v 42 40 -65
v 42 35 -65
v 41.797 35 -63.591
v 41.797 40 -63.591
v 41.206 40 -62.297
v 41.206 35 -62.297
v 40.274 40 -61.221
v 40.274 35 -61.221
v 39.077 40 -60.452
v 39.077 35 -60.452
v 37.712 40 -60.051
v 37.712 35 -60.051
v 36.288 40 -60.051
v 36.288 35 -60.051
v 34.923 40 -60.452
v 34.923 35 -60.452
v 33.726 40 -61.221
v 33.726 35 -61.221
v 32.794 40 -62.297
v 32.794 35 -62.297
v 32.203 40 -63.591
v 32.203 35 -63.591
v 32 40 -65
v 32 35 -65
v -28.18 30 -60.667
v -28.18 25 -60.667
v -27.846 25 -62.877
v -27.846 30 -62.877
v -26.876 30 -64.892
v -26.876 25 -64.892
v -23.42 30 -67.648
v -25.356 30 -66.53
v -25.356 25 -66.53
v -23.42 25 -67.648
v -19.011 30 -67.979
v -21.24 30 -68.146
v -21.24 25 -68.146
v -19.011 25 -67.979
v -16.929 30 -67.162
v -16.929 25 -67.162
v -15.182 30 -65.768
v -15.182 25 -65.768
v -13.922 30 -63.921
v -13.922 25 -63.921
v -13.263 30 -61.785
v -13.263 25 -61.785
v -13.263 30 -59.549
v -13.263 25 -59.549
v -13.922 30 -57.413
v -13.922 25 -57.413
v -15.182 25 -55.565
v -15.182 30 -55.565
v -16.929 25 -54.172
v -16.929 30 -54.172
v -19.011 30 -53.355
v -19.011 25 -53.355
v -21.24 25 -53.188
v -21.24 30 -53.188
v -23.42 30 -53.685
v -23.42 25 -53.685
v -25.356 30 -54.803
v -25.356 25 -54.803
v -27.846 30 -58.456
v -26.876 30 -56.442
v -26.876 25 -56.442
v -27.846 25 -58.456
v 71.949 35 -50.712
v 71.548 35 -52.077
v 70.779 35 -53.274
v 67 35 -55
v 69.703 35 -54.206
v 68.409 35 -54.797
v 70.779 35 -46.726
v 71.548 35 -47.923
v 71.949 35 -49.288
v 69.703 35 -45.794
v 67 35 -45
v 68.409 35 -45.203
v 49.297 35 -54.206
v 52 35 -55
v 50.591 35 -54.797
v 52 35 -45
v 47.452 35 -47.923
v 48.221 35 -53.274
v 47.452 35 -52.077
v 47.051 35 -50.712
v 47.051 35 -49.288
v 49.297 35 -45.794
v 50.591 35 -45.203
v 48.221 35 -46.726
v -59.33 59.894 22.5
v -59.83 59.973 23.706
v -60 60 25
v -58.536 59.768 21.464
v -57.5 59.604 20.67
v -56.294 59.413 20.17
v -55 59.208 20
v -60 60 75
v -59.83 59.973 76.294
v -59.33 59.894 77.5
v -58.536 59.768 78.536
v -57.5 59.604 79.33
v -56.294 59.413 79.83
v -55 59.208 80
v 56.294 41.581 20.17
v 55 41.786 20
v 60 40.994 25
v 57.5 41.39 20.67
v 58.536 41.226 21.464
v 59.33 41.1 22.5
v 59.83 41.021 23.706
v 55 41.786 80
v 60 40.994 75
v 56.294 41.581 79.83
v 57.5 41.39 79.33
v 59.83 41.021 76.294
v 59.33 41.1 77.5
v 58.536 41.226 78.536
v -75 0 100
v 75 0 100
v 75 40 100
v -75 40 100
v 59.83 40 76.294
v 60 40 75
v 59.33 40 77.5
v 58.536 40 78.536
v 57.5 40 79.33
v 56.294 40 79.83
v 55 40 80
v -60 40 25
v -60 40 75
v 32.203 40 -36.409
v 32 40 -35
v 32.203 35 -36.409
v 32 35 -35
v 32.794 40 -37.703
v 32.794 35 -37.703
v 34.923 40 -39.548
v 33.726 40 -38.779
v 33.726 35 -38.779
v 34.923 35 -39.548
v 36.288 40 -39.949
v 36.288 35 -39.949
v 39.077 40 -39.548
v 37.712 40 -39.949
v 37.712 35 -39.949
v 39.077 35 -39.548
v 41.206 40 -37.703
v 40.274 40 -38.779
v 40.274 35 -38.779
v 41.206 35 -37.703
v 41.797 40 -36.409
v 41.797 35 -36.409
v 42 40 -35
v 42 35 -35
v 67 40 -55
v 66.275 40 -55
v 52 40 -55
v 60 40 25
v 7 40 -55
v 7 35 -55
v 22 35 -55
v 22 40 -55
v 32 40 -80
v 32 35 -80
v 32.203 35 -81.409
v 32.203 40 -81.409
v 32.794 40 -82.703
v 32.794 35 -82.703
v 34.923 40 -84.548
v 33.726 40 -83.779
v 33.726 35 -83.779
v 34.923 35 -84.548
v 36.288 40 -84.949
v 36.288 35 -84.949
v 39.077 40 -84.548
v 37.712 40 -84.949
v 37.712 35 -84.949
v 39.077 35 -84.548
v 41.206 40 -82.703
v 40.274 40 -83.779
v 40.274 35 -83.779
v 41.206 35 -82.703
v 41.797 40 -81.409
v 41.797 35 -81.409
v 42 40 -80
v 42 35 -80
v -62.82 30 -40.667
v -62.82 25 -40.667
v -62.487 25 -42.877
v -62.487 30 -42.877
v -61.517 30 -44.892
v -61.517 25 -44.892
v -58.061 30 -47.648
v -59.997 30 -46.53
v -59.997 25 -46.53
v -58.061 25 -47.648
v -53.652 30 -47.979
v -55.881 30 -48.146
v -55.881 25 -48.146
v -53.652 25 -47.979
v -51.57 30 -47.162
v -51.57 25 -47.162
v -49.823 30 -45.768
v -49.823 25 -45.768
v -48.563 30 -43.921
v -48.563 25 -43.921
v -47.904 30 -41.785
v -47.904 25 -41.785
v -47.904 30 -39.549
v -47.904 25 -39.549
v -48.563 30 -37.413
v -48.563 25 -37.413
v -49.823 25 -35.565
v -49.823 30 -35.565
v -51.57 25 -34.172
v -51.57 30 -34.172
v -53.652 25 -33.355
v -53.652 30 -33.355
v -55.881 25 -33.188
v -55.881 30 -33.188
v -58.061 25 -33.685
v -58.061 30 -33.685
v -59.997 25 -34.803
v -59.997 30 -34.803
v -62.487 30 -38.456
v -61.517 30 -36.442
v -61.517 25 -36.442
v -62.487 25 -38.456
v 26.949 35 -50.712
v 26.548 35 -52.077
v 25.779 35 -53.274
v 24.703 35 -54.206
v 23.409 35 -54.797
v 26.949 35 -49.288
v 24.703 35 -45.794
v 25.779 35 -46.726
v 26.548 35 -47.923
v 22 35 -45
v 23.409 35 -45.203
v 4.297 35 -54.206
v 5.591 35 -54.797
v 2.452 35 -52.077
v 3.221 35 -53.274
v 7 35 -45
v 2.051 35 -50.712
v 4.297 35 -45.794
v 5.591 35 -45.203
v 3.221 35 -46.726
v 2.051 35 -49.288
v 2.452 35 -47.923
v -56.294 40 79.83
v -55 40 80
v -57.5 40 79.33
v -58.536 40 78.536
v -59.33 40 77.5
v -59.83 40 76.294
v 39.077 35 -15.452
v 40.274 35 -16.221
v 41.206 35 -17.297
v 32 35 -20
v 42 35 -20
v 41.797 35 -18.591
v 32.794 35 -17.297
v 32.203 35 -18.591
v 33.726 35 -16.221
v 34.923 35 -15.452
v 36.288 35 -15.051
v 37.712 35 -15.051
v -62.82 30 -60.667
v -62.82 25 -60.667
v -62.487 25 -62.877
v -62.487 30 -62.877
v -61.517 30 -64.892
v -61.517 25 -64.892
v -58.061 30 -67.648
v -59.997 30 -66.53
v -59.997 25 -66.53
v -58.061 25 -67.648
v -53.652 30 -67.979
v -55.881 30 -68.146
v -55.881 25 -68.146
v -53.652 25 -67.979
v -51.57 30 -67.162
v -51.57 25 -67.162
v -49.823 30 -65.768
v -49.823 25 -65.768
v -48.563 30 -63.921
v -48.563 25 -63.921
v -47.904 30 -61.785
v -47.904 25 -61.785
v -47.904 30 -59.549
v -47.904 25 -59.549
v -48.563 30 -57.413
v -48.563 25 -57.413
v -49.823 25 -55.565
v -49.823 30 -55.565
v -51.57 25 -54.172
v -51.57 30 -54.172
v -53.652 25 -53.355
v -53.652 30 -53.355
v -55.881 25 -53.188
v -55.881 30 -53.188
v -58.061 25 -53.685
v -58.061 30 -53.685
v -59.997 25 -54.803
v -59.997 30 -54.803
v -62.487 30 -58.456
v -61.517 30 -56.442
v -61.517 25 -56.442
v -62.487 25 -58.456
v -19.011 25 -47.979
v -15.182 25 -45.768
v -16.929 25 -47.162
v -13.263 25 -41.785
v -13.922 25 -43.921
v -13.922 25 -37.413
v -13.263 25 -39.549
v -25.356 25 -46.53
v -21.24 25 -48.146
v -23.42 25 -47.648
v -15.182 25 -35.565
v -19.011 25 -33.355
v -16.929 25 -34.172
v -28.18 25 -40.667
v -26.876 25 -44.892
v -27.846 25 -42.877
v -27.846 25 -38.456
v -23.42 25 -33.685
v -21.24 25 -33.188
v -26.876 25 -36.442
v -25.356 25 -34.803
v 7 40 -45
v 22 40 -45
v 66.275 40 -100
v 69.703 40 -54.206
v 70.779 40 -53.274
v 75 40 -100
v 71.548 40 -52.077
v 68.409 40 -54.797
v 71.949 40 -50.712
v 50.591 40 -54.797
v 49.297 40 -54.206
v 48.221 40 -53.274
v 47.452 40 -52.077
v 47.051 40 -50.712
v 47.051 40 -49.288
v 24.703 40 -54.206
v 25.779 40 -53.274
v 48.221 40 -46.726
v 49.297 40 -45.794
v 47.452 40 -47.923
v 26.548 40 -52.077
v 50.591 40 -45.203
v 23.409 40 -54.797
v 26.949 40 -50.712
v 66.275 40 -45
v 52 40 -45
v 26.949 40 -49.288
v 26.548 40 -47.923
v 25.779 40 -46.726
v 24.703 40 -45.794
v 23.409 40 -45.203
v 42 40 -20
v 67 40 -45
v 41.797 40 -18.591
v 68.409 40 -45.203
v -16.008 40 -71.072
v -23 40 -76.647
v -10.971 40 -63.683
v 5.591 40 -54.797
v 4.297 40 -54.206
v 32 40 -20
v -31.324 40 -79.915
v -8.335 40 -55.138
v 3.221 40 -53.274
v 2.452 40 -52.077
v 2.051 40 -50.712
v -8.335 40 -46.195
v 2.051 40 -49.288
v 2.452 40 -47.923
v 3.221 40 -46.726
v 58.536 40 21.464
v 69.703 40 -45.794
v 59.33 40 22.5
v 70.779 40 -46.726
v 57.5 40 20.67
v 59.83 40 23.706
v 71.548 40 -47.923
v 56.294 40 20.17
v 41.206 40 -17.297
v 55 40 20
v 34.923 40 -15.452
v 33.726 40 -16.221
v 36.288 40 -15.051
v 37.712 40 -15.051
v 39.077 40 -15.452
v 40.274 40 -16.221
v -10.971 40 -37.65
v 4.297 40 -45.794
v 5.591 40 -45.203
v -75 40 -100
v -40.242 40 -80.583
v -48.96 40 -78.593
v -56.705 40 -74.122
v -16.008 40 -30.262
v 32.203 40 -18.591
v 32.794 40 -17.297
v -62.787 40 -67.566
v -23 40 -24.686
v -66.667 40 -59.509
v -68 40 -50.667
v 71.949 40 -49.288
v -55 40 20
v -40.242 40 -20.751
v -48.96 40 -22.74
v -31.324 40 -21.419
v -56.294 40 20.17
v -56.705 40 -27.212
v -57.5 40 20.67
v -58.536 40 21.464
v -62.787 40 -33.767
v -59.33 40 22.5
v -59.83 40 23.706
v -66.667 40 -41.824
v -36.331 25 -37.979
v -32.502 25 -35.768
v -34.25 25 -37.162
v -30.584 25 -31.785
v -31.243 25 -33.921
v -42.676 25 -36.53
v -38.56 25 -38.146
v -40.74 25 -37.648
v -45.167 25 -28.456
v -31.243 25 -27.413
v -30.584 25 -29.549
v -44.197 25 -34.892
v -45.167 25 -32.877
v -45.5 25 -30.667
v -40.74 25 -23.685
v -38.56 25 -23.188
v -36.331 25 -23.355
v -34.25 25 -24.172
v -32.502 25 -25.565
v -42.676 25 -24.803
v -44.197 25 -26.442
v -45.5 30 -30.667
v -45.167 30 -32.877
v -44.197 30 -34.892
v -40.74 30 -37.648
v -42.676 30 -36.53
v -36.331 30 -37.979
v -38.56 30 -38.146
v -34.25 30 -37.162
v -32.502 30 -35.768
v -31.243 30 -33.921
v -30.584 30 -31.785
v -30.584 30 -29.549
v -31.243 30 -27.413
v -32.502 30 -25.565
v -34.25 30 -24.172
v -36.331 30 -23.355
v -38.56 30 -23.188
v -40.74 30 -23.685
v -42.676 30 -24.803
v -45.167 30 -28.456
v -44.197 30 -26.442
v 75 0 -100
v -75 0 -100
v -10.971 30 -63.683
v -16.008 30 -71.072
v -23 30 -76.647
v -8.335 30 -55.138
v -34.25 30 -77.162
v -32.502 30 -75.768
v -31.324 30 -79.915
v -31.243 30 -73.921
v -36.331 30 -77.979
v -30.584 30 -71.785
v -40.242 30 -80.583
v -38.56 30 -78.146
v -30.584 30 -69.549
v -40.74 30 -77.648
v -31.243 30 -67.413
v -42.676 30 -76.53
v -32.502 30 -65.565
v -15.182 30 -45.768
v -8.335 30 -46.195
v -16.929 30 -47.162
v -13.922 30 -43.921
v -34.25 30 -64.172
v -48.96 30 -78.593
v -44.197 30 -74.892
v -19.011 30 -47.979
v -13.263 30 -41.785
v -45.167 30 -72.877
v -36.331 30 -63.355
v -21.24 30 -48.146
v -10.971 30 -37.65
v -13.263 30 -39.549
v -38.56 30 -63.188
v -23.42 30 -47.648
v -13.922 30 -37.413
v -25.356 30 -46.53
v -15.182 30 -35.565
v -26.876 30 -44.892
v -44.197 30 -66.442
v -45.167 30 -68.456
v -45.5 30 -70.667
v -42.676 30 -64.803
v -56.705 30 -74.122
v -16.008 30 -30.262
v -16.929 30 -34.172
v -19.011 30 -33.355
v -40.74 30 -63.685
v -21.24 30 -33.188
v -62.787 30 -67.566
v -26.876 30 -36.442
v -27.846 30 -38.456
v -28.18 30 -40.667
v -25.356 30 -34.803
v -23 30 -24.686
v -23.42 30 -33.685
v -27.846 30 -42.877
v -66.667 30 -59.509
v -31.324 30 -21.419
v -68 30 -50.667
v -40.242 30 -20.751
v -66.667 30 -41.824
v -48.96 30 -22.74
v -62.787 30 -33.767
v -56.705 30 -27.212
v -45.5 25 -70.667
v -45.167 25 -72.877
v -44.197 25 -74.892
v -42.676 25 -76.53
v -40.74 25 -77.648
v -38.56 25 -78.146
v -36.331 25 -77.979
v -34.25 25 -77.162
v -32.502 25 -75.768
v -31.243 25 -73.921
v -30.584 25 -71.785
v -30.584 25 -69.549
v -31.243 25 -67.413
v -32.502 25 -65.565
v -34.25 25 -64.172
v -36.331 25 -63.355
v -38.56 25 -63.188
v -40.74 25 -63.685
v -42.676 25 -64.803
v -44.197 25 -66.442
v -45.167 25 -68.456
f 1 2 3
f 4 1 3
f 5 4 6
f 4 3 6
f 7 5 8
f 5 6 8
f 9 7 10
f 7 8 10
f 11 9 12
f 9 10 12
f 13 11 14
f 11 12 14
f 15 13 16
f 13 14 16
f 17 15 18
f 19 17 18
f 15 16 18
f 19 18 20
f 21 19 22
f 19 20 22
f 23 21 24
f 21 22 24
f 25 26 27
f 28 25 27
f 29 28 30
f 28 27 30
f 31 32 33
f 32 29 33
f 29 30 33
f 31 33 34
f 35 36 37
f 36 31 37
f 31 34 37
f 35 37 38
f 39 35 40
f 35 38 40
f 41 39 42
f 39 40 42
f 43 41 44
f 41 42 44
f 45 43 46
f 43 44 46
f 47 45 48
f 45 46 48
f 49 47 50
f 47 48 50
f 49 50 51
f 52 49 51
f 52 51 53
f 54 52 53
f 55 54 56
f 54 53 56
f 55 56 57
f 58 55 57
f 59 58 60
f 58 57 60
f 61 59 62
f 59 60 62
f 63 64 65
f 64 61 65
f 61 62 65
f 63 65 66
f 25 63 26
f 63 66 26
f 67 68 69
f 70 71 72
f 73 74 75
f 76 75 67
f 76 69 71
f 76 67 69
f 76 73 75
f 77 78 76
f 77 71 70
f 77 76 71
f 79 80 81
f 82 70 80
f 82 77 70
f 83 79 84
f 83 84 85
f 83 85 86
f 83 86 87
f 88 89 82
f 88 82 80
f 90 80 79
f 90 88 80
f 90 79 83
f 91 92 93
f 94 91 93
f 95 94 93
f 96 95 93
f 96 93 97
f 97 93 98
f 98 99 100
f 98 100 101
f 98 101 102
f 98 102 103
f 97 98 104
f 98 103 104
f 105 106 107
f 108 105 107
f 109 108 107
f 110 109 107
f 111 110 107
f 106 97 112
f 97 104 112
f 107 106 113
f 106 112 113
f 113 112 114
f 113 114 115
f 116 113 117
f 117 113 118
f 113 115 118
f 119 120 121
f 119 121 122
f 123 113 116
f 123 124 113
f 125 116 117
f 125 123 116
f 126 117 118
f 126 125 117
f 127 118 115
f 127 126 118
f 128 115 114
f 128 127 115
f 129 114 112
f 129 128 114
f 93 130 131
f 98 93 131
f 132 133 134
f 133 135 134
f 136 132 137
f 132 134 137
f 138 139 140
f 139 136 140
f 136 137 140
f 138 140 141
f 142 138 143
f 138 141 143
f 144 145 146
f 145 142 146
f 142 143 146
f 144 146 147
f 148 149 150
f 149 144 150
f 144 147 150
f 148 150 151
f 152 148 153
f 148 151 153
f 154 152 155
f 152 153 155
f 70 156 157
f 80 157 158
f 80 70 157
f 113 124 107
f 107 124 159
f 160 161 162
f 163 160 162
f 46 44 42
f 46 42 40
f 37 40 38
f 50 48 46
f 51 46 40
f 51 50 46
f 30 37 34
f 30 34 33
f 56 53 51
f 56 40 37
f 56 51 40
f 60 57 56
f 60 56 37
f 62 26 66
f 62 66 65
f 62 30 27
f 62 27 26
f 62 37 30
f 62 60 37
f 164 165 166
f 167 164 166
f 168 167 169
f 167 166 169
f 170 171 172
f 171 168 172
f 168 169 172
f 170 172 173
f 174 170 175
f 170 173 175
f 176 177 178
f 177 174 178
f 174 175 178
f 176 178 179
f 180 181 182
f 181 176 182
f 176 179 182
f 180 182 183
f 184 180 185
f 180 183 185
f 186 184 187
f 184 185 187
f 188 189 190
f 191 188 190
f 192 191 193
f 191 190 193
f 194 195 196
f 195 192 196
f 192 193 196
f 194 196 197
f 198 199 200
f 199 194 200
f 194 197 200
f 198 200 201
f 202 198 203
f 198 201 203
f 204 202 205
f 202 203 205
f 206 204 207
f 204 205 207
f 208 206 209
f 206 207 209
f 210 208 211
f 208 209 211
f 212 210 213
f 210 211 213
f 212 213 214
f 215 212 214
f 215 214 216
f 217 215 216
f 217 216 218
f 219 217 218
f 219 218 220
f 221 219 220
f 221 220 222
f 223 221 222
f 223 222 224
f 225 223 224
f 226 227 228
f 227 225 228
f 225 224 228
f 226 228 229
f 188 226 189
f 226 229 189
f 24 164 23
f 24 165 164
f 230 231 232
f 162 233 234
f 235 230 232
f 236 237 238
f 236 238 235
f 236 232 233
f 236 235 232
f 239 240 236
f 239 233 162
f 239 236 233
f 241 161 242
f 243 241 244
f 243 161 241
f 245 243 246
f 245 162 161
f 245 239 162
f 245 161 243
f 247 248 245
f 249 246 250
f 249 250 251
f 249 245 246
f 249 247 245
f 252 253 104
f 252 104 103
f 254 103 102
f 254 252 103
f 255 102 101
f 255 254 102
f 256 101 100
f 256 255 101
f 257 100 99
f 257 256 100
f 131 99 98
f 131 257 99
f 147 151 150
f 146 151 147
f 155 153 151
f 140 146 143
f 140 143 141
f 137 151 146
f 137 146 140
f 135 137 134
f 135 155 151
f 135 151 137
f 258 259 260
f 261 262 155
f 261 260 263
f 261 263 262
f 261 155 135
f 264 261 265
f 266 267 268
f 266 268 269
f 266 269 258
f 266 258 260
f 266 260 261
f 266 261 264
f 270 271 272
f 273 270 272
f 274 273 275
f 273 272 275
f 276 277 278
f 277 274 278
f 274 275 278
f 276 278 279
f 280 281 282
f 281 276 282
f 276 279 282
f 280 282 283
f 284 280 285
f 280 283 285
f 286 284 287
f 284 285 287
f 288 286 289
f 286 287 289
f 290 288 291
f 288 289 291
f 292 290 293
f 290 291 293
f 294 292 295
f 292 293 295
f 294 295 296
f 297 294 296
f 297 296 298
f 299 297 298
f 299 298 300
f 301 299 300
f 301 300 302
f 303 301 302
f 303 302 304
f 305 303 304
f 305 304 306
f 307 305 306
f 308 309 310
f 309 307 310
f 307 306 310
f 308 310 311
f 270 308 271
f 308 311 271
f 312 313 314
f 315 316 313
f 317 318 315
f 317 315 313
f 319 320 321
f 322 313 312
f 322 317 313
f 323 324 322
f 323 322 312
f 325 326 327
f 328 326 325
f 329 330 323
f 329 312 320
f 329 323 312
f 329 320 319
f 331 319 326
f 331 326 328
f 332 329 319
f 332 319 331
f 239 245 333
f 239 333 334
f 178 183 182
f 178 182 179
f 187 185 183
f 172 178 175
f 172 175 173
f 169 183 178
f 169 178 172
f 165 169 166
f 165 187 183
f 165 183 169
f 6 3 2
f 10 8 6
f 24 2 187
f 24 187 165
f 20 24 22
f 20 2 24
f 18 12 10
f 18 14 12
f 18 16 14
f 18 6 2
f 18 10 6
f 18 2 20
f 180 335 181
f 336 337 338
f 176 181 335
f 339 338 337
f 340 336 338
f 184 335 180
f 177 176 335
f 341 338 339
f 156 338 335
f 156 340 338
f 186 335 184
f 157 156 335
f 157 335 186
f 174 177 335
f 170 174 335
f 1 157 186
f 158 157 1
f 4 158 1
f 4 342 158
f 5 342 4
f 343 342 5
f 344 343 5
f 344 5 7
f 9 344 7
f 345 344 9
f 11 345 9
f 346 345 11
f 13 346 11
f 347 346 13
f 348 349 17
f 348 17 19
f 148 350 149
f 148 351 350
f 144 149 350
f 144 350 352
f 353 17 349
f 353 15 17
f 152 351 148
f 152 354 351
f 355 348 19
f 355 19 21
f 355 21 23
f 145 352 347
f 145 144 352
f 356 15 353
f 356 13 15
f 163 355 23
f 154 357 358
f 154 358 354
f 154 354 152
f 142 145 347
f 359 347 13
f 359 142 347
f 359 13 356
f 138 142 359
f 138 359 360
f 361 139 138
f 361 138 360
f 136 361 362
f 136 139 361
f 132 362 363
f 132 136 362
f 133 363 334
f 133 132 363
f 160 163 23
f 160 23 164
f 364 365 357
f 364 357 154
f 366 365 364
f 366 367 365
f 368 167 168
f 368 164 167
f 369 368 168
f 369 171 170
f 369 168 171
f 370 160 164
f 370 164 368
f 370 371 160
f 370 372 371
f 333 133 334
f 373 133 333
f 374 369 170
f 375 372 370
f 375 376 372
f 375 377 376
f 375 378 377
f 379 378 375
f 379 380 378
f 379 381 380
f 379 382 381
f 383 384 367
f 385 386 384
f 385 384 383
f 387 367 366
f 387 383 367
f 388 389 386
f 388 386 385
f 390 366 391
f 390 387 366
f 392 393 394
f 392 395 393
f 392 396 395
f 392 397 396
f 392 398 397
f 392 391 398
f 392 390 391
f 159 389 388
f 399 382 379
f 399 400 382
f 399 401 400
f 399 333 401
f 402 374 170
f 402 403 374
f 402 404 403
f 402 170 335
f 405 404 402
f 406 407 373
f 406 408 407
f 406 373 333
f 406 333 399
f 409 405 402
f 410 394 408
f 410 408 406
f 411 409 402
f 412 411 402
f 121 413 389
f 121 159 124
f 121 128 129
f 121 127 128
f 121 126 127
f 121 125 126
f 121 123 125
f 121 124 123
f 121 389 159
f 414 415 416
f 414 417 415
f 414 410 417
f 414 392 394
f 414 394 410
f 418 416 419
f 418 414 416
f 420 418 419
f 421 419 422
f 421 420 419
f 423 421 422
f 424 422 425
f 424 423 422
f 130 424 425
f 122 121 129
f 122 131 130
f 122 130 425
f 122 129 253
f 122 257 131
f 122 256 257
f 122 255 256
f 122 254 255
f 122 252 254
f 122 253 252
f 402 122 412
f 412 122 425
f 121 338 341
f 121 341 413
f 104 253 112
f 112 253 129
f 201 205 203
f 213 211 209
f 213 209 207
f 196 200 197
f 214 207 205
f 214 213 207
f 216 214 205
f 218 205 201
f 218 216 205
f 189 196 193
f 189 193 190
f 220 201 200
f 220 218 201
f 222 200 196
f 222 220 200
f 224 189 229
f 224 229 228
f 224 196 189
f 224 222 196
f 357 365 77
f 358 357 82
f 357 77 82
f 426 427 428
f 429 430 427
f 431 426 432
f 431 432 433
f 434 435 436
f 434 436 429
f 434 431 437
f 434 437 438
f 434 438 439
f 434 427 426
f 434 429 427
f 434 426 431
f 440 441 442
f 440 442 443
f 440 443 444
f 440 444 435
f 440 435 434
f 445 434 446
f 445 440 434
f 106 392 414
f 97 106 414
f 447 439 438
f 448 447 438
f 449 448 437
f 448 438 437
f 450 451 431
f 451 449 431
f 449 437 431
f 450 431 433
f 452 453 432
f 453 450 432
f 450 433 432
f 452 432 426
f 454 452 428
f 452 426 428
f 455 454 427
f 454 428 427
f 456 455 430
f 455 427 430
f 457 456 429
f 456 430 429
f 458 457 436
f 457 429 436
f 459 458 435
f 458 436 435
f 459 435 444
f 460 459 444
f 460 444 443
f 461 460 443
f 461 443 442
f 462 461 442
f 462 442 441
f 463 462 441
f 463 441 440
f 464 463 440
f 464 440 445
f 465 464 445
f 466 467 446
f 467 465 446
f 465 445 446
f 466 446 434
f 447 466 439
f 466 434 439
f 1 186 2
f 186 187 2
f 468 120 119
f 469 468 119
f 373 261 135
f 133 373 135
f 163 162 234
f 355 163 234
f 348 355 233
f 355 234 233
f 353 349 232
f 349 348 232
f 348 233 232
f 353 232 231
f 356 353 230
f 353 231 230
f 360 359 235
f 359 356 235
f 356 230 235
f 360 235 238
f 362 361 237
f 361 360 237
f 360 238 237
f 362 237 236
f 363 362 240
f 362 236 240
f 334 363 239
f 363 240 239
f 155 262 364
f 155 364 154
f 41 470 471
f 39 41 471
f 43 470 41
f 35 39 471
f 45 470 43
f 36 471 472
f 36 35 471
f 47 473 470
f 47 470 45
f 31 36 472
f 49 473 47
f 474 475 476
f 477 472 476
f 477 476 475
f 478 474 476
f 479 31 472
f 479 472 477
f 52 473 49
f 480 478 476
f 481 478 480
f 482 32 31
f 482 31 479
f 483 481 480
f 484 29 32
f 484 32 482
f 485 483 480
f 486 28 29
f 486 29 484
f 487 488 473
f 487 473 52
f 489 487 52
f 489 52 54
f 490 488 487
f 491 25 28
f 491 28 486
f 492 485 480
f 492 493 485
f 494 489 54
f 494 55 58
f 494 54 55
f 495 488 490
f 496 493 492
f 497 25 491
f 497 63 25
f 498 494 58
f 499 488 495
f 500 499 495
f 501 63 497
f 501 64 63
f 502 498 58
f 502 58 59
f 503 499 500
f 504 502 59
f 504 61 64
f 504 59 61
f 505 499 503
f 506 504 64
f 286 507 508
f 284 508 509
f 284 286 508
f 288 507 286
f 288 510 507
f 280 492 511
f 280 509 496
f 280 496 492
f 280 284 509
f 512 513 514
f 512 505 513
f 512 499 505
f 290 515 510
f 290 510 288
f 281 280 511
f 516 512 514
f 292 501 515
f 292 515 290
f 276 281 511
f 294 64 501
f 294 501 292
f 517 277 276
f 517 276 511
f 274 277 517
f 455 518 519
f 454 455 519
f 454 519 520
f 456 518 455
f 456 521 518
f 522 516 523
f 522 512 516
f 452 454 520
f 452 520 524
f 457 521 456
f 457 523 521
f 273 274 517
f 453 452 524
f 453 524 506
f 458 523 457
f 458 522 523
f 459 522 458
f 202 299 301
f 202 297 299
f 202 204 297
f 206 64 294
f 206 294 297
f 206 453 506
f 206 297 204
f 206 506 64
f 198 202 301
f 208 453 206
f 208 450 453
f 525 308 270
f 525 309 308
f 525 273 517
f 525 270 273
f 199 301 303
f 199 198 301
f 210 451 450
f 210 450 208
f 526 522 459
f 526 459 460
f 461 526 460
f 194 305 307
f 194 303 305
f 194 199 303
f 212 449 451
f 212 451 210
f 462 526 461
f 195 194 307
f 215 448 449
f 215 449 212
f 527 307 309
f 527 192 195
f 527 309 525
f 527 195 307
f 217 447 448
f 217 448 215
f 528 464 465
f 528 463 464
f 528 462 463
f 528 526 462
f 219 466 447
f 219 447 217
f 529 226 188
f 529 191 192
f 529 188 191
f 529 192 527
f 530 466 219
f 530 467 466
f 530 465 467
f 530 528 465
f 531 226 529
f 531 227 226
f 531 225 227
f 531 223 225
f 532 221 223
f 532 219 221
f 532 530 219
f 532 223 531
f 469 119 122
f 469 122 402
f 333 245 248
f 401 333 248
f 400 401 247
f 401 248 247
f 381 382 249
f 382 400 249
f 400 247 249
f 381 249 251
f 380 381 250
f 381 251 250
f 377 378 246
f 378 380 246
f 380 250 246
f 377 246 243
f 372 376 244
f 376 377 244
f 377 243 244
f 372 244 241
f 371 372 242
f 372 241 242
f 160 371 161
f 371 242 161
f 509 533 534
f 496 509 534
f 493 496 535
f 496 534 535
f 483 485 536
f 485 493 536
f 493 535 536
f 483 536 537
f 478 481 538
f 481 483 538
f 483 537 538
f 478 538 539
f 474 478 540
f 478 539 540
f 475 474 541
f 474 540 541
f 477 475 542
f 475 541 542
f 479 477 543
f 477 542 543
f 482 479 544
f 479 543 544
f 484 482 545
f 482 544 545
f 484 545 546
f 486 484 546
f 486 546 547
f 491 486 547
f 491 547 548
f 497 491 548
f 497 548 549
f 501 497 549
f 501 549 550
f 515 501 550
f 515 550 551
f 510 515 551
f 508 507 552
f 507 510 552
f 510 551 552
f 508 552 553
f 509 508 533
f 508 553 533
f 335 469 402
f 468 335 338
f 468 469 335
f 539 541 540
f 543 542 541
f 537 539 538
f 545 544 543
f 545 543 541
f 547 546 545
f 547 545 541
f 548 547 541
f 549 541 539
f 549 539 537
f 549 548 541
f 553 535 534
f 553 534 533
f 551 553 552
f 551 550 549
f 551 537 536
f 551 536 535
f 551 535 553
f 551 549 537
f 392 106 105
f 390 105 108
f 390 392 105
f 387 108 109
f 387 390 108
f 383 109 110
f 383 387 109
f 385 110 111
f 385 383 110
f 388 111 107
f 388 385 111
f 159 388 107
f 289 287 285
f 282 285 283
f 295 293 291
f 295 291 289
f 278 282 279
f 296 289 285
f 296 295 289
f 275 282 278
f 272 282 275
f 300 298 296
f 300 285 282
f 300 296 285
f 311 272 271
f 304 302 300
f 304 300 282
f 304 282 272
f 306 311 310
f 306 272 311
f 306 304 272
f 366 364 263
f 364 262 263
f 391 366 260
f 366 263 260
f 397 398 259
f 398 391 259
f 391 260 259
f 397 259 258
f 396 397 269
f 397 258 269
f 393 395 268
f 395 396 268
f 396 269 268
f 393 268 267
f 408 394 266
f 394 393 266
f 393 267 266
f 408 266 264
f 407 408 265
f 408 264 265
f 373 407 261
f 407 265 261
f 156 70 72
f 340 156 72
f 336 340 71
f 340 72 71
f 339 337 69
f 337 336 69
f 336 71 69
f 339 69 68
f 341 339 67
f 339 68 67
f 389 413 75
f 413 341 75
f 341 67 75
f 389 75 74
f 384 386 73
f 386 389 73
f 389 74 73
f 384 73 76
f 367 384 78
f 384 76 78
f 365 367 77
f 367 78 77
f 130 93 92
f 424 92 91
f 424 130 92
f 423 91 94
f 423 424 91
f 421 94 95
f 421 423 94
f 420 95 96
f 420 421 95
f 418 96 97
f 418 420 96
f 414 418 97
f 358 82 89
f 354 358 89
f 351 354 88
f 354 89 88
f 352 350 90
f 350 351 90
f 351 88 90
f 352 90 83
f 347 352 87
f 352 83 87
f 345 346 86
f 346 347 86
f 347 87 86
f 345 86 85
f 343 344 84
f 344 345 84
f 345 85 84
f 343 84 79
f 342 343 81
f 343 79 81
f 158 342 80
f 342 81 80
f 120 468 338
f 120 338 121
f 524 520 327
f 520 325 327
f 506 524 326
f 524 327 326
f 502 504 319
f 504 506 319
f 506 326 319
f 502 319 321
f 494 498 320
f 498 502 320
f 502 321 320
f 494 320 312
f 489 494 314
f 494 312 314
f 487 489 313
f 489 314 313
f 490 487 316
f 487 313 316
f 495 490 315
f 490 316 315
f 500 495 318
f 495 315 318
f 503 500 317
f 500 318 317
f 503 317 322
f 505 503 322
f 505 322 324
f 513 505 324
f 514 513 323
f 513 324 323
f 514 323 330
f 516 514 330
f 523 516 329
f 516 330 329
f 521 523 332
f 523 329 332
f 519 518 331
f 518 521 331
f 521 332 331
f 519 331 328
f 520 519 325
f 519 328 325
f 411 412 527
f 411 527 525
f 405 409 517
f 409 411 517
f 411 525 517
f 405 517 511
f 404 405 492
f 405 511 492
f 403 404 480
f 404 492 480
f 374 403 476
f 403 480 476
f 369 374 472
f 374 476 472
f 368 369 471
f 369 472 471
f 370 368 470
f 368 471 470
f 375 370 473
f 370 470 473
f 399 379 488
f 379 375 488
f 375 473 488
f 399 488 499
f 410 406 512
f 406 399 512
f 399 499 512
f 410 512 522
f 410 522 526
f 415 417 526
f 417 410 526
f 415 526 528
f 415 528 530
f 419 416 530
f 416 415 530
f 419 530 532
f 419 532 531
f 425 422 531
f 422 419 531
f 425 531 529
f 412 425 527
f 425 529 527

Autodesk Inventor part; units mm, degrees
ref_plane "YZ Plane" through (0, 0, 0) normal (1, 0, 0) x (0, 1, 0)
ref_plane "XZ Plane" through (0, 0, 0) normal (0, 1, 0) x (-1, 0, 0)
sketch "Sketch1" plane through (0, 0, 0) normal (0, 1, 0) x (-1, 0, 0)
  line L0 (75, -100) -> (-75, -100)
  line L1 (-75, -100) -> (-75, 100)
  line L2 (-75, 100) -> (75, 100)
  line L3 (75, 100) -> (75, -100)
  line L4 (75, -100) -> (-75, 100) construction
  line L5 (-75, -100) -> (75, 100) construction
  line L6 (55, 80) -> (-55, 80)
  line L7 (-60, 75) -> (-60, 25)
  line L8 (-55, 20) -> (55, 20)
  line L9 (60, 25) -> (60, 75)
  line L10 (60, 80) -> (-60, 20) construction
  line L11 (-60, 80) -> (60, 20) construction
  circle A0 centre (38, -50.6667) radius 30
  circle A1 centre (38, -70.6667) radius 7.5
  circle A2 centre (55.3205, -60.6667) radius 7.5
  circle A3 centre (55.3205, -40.6667) radius 7.5
  circle A4 centre (38, -30.6667) radius 7.5
  circle A5 centre (20.6795, -40.6667) radius 7.5
  circle A6 centre (20.6795, -60.6667) radius 7.5
  arc A7 (55, 20) -> (60, 25) centre (55, 25) ccw
  arc A8 (60, 75) -> (55, 80) centre (55, 75) ccw
  arc A9 (-55, 80) -> (-60, 75) centre (-55, 75) ccw
  arc A10 (-60, 25) -> (-55, 20) centre (-55, 25) ccw
  arc A11 (-42, -64.1421) -> (-41.9301, -64.1667) centre (-37, -50) ccw
  arc A12 (-22, -45) -> (-22, -55) centre (-22, -50) ccw
  arc A13 (-7, -55) -> (-7, -45) centre (-7, -50) ccw
  line L12 (-7, -45) -> (-22, -45)
  line L13 (-7, -55) -> (-22, -55)
  line L14 (-42, -20) -> (-42, -35)
  arc A14 (-42, -35) -> (-32, -35) centre (-37, -35) ccw
  line L15 (-32, -20) -> (-32, -35)
  arc A15 (-32, -20) -> (-42, -20) centre (-37, -20) ccw
  line L16 (-67, -55) -> (-52, -55)
  arc A16 (-52, -55) -> (-52, -45) centre (-52, -50) ccw
  line L17 (-67, -45) -> (-52, -45)
  arc A17 (-67, -45) -> (-67, -55) centre (-67, -50) ccw
  line L18 (-32, -80) -> (-32, -65)
  arc A18 (-32, -65) -> (-42, -65) centre (-37, -65) ccw
  line L19 (-42, -80) -> (-42, -65)
  arc A19 (-42, -80) -> (-32, -80) centre (-37, -80) ccw
  point P0 (0, 0)
  point P1 (0, 50)
  dimension "d0" = 150
  dimension "d1" = 200
  dimension "d2" = 50
  dimension "d3" = 75
  dimension "d4" = 60
  dimension "d5" = 120
  dimension "d29" = 15
  dimension "d30" = 20
  dimension "d33" = 360
  dimension "d35" = 5
  dimension "d36" = 5
  dimension "d37" = 30
  dimension "d38" = 100
  dimension "d39" = 38
  dimension "d42" = 15
  dimension "d45" = 360
  dimension "d47" = 75
  dimension "d62" = 60
  dimension "d63" = 5
  dimension "d64" = 5
extrude "Extrusion1" add sketch "Sketch1" along normal blind 40 contours L0 L1 L2 L3
extrude "Extrusion2" add sketch "Sketch1" along normal blind 60 contours A8 L9 A7 L8 A10 L7 A9 L6
extrude "Extrusion3" add sketch "Sketch1" along normal blind 30 contours A0
extrude "Extrusion4" add sketch "Sketch1" along normal blind 35 contours L12 A13 L13 A12 | A15 L15 A14 L14 | A17 L17 A16 L16 | A19 L19 A18 L18
extrude "Extrusion5" add sketch "Sketch1" along normal blind 25 contours A1 | A2 | A3 | A4 | A5 | A6
ref_plane "Work Plane1" through (-55, 40, 80) normal (0, 0, 1) x (1, 0, 0)
sketch "Sketch2" plane through (-55, 40, 80) normal (0, 0, 1) x (1, 0, 0)
  line L0 (-5, 0) -> (-5, 20) projected
  line L1 (-5, 20) -> (121.275, 0)
  line L2 (-5, 20) -> (122.8491, 20) construction
  line L3 (121.275, 0) -> (121.275, 40.187)
  line L4 (122, 0) -> (127, 0) projected
  line L5 (121.275, 40.187) -> (-5, 40.187)
  line L6 (-5, 40.187) -> (-5, 20)
  point P0 (55, -40)
  dimension "d59" = 9
extrude "Extrusion6" cut sketch "Sketch2" against normal through all
properties part number "Tarefa 4" material "Glass"
